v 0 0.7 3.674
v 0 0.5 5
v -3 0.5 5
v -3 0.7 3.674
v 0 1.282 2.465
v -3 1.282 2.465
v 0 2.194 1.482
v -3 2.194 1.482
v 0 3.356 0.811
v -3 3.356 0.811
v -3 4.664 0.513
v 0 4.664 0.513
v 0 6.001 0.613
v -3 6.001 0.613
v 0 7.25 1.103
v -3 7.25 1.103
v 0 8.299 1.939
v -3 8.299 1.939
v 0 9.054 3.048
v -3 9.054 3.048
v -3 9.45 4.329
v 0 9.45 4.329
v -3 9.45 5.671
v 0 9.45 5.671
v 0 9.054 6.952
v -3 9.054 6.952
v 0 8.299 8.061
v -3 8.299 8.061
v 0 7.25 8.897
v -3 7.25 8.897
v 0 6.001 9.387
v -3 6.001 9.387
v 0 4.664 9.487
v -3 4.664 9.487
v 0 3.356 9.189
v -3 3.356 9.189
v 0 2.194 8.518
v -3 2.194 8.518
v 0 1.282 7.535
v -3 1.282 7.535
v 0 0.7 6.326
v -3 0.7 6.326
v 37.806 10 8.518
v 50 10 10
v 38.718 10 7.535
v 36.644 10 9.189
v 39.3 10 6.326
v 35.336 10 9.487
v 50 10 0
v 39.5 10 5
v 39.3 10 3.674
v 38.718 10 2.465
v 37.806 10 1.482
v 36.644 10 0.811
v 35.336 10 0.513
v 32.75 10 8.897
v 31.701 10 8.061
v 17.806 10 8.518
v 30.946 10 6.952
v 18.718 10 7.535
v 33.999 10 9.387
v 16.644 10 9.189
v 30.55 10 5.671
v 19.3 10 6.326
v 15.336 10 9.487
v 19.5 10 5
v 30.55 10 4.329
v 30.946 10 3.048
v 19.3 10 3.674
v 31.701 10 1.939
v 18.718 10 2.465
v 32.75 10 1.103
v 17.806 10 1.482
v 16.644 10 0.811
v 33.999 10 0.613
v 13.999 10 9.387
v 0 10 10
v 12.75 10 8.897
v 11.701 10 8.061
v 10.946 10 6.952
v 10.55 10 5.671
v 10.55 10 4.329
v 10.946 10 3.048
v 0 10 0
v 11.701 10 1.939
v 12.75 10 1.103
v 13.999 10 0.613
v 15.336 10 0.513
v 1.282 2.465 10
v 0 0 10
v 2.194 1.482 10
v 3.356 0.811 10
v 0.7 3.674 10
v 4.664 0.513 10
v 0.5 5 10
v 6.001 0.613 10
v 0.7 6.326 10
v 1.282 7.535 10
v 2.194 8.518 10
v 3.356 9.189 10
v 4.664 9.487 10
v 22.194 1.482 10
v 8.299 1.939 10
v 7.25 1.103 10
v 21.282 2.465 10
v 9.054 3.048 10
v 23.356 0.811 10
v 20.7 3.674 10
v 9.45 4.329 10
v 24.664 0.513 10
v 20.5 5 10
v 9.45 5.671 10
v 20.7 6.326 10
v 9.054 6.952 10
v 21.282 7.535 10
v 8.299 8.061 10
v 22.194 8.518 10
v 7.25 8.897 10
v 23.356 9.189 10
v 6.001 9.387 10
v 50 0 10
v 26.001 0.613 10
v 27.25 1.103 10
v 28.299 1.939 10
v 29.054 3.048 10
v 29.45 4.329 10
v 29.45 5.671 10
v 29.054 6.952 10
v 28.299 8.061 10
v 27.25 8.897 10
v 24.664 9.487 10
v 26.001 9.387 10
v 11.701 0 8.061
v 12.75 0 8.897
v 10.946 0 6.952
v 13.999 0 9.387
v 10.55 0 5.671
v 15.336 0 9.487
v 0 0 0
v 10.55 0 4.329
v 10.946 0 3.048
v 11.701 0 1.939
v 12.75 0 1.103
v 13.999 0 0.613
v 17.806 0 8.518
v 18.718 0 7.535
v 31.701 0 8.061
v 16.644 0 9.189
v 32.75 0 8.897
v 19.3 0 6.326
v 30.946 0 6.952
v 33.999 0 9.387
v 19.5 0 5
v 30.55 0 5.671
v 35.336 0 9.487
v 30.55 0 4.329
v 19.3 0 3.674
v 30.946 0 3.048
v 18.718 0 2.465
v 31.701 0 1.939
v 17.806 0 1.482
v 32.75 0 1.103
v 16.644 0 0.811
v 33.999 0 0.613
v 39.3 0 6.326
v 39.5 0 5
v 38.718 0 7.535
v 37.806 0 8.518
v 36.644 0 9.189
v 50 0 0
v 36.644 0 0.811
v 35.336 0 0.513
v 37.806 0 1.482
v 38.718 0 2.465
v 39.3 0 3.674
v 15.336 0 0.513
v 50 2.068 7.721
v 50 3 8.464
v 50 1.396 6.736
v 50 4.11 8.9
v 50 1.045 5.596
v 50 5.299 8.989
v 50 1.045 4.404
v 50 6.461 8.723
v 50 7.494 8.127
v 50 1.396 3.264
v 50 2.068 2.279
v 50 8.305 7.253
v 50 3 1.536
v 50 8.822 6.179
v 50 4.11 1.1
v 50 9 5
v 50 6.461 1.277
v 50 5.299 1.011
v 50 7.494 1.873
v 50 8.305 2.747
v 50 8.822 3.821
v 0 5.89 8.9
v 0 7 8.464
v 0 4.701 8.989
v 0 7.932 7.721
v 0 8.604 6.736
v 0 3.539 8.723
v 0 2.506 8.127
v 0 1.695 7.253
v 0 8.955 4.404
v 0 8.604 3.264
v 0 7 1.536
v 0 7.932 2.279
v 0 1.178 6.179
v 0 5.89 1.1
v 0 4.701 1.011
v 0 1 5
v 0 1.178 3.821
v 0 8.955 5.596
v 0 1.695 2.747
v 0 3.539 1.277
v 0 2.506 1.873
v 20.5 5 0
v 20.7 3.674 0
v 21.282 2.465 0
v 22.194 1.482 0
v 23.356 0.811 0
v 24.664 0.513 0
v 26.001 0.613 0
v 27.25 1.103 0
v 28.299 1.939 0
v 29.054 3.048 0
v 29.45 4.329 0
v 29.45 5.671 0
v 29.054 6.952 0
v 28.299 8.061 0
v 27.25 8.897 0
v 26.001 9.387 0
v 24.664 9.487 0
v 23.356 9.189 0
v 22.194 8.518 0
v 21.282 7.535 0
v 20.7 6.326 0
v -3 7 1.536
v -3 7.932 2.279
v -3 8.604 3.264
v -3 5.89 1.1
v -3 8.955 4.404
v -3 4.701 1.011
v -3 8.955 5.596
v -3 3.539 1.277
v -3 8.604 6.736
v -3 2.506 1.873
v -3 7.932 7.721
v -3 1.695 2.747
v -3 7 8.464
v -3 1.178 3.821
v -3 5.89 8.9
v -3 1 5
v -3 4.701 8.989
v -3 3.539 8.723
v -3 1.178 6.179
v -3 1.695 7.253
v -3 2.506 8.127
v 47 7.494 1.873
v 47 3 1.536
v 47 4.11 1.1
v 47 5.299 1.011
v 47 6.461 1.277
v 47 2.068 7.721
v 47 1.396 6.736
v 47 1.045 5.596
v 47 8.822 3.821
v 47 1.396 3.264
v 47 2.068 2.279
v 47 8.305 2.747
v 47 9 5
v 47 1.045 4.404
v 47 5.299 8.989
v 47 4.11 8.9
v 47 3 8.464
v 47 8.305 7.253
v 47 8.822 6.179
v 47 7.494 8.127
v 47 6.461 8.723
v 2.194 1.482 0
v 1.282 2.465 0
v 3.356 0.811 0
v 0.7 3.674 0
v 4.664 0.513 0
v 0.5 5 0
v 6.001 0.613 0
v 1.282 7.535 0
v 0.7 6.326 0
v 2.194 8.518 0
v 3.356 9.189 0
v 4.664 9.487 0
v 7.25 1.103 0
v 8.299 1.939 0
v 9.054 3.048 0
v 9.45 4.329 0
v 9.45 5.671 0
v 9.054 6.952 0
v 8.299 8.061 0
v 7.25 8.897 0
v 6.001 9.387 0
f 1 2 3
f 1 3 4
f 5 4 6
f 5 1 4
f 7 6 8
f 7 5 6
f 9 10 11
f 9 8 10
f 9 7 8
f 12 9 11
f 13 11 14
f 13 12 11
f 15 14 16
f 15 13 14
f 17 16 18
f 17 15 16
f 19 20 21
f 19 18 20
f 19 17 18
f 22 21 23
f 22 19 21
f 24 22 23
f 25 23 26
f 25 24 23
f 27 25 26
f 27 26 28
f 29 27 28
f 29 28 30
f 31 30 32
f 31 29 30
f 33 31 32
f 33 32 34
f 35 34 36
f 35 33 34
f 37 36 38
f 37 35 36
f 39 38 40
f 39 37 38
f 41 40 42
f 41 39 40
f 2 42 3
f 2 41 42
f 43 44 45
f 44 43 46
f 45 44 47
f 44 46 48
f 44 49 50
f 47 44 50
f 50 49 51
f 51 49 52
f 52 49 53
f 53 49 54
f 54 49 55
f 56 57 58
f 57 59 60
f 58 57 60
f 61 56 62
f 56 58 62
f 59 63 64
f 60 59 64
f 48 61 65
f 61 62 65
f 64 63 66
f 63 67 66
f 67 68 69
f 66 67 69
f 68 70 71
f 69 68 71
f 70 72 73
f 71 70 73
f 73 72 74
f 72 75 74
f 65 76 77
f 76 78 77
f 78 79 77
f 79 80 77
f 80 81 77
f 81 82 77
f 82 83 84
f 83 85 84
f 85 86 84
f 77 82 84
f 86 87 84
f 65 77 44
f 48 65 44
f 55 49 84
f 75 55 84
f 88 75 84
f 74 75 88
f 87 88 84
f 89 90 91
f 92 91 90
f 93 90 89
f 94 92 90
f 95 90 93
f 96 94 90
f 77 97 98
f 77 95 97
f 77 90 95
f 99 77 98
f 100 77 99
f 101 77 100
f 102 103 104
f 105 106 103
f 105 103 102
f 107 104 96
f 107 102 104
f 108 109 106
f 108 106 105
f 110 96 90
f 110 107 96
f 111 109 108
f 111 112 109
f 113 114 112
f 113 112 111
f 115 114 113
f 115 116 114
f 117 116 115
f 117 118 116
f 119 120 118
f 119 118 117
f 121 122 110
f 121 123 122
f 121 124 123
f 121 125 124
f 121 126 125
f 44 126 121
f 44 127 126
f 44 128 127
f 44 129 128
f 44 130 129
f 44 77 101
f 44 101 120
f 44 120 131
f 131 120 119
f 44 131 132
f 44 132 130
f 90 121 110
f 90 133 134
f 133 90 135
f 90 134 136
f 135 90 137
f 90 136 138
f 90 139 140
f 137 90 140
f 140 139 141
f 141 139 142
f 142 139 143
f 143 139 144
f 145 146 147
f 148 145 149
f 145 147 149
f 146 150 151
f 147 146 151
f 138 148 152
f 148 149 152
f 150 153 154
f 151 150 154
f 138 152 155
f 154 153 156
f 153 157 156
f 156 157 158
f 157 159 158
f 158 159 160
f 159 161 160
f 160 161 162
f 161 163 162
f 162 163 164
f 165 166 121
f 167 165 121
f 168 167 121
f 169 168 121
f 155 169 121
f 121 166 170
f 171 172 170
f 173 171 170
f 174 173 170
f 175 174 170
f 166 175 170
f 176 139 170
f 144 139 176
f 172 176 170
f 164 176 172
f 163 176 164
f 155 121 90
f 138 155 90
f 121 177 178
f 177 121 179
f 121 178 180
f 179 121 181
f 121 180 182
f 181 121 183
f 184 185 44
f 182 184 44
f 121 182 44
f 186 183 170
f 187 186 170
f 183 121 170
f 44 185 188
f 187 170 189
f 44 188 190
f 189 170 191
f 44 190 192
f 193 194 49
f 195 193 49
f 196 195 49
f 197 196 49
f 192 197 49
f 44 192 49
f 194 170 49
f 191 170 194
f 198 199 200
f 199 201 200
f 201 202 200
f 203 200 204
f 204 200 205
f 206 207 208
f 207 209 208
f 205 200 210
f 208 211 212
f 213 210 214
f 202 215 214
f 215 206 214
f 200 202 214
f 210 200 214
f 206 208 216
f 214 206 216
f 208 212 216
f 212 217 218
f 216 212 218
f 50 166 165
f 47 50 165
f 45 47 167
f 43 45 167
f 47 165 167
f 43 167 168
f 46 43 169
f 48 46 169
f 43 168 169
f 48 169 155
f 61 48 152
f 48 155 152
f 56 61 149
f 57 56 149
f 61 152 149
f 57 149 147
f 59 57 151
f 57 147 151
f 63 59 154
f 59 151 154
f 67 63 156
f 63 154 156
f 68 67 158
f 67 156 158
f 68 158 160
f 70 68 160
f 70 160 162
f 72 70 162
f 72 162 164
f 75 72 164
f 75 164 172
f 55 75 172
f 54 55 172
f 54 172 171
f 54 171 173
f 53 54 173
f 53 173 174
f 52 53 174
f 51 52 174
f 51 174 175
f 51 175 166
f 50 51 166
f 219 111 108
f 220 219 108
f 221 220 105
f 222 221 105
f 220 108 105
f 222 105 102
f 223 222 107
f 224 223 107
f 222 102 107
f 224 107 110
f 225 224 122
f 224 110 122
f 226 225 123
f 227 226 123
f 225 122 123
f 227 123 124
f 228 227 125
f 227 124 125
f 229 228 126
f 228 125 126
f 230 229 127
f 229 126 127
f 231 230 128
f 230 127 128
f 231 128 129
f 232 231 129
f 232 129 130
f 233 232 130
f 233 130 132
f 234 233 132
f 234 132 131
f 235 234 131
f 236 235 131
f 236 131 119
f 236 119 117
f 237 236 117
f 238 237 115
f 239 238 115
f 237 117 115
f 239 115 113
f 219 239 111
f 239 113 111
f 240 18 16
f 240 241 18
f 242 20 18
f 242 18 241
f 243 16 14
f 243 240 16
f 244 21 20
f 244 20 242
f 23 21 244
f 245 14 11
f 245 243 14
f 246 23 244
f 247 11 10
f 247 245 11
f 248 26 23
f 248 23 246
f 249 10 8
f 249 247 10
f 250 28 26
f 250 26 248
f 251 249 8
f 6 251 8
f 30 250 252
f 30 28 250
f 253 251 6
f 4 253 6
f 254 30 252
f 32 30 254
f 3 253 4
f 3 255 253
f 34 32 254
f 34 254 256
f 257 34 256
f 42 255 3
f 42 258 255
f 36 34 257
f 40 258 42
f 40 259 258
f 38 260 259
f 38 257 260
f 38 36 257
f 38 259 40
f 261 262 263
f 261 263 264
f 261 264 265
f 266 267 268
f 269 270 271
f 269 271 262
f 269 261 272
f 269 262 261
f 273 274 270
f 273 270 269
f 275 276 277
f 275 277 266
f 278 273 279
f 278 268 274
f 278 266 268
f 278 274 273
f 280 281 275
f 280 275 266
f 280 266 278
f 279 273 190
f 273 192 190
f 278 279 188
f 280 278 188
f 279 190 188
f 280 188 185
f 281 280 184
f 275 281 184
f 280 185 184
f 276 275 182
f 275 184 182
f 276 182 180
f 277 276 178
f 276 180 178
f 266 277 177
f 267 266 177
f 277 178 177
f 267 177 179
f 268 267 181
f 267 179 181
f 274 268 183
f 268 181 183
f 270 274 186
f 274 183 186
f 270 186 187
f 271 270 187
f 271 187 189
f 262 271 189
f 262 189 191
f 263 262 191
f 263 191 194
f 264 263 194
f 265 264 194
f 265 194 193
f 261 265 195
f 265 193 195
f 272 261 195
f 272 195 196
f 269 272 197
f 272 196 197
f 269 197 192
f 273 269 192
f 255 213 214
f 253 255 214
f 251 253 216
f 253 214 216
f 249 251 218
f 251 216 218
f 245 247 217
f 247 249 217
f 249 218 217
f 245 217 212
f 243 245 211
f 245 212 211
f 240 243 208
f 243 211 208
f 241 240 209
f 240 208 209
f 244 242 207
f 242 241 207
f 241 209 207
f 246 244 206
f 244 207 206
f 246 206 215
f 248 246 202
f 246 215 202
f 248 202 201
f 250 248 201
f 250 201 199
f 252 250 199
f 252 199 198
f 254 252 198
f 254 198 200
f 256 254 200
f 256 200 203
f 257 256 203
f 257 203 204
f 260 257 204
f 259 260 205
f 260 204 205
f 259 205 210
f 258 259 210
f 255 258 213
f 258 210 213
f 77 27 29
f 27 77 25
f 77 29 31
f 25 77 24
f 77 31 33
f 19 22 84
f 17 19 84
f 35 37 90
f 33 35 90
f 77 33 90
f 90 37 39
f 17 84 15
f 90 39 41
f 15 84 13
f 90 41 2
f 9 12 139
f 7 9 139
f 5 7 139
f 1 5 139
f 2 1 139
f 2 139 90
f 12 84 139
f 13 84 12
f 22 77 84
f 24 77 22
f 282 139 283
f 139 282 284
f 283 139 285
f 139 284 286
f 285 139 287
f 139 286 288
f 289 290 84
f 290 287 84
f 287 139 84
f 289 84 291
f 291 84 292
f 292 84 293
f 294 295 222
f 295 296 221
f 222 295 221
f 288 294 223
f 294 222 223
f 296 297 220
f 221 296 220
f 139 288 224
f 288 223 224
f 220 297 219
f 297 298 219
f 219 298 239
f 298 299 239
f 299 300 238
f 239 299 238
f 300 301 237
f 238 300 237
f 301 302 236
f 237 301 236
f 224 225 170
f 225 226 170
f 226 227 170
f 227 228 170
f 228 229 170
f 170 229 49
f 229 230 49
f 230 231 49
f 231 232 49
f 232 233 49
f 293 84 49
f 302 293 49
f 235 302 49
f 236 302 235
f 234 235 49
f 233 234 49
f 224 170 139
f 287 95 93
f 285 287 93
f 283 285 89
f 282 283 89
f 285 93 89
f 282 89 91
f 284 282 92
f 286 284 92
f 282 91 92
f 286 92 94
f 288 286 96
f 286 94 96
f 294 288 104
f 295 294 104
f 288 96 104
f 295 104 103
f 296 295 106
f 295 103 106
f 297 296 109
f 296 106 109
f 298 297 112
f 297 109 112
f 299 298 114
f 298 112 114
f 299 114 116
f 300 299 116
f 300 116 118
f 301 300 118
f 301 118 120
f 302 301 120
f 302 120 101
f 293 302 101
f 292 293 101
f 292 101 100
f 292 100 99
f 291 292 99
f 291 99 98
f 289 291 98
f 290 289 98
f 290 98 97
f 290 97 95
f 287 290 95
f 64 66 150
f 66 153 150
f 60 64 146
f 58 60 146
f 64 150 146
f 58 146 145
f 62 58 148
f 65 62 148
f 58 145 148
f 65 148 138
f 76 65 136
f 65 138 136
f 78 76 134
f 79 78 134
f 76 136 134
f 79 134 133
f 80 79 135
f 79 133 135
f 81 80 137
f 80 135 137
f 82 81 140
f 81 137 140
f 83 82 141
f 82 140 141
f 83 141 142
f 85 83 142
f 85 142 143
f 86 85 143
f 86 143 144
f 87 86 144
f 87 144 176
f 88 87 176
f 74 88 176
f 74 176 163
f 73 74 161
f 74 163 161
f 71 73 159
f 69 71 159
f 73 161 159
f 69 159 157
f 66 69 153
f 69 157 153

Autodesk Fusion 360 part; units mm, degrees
sketch "Sketch1" plane through (0, 0, 0) normal (0, 0, 1) x (1, 0, 0)
  line L0 (0, 0) -> (50, 0)
  line L1 (50, 0) -> (50, 10)
  line L2 (50, 10) -> (0, 10)
  line L3 (0, 10) -> (0, 0)
  dimension "d1" = 50
  dimension "d2" = 10
extrude "Extrude1" add sketch "Sketch1" along normal blind 10
sketch "Sketch2" plane through (0, 0, 10) normal (0, 0, 1) x (-1, 0, 0)
  line L0 (0, -10) -> (0, 0)
  line L1 (0, 0) -> (-50, 0)
  line L2 (-50, 0) -> (-50, -10)
  line L3 (-50, -10) -> (0, -10)
  circle A0 centre (-5, -5) radius 4.5
  circle A1 centre (-25, -5) radius 4.5
  dimension "d5" = 9
  dimension "d6" = 9
extrude "Extrude2" cut sketch "Sketch2" against normal blind 11 contours A0 | A1
sketch "Sketch3" plane through (50, 0, 0) normal (1, 0, 0) x (0, 1, 0)
  line L0 (0, 0) -> (10, 0)
  line L1 (10, 0) -> (10, 10)
  line L2 (10, 10) -> (0, 10)
  line L3 (0, 10) -> (0, 0)
  circle A0 centre (5, 5) radius 4
  dimension "d9" = 8
extrude "Extrude3" cut sketch "Sketch3" against normal blind 3 contours A0
sketch "Sketch4" plane through (0, 0, 0) normal (0, -1, 0) x (1, 0, 0)
  line L0 (0, 0) -> (50, 0)
  line L1 (50, 0) -> (50, 10)
  line L2 (50, 10) -> (0, 10)
  line L3 (0, 10) -> (0, 0)
  circle A0 centre (15, 5) radius 4.5
  circle A1 centre (35, 5) radius 4.5
  dimension "d12" = 9
  dimension "d13" = 9
extrude "Extrude4" cut sketch "Sketch4" against normal blind 20 contours A0 | A1
sketch "Sketch5" plane through (0, 0, 0) normal (-1, 0, 0) x (0, -1, 0)
  line L0 (-10, 0) -> (0, 0)
  line L1 (0, 0) -> (0, 10)
  line L2 (0, 10) -> (-10, 10)
  line L3 (-10, 10) -> (-10, 0)
  circle A0 centre (-5, 5) radius 4.5
  circle A1 centre (-5, 5) radius 4
  dimension "d16" = 9
  dimension "d17" = 8
extrude "Extrude5" add sketch "Sketch5" along normal blind 3 contours A0
